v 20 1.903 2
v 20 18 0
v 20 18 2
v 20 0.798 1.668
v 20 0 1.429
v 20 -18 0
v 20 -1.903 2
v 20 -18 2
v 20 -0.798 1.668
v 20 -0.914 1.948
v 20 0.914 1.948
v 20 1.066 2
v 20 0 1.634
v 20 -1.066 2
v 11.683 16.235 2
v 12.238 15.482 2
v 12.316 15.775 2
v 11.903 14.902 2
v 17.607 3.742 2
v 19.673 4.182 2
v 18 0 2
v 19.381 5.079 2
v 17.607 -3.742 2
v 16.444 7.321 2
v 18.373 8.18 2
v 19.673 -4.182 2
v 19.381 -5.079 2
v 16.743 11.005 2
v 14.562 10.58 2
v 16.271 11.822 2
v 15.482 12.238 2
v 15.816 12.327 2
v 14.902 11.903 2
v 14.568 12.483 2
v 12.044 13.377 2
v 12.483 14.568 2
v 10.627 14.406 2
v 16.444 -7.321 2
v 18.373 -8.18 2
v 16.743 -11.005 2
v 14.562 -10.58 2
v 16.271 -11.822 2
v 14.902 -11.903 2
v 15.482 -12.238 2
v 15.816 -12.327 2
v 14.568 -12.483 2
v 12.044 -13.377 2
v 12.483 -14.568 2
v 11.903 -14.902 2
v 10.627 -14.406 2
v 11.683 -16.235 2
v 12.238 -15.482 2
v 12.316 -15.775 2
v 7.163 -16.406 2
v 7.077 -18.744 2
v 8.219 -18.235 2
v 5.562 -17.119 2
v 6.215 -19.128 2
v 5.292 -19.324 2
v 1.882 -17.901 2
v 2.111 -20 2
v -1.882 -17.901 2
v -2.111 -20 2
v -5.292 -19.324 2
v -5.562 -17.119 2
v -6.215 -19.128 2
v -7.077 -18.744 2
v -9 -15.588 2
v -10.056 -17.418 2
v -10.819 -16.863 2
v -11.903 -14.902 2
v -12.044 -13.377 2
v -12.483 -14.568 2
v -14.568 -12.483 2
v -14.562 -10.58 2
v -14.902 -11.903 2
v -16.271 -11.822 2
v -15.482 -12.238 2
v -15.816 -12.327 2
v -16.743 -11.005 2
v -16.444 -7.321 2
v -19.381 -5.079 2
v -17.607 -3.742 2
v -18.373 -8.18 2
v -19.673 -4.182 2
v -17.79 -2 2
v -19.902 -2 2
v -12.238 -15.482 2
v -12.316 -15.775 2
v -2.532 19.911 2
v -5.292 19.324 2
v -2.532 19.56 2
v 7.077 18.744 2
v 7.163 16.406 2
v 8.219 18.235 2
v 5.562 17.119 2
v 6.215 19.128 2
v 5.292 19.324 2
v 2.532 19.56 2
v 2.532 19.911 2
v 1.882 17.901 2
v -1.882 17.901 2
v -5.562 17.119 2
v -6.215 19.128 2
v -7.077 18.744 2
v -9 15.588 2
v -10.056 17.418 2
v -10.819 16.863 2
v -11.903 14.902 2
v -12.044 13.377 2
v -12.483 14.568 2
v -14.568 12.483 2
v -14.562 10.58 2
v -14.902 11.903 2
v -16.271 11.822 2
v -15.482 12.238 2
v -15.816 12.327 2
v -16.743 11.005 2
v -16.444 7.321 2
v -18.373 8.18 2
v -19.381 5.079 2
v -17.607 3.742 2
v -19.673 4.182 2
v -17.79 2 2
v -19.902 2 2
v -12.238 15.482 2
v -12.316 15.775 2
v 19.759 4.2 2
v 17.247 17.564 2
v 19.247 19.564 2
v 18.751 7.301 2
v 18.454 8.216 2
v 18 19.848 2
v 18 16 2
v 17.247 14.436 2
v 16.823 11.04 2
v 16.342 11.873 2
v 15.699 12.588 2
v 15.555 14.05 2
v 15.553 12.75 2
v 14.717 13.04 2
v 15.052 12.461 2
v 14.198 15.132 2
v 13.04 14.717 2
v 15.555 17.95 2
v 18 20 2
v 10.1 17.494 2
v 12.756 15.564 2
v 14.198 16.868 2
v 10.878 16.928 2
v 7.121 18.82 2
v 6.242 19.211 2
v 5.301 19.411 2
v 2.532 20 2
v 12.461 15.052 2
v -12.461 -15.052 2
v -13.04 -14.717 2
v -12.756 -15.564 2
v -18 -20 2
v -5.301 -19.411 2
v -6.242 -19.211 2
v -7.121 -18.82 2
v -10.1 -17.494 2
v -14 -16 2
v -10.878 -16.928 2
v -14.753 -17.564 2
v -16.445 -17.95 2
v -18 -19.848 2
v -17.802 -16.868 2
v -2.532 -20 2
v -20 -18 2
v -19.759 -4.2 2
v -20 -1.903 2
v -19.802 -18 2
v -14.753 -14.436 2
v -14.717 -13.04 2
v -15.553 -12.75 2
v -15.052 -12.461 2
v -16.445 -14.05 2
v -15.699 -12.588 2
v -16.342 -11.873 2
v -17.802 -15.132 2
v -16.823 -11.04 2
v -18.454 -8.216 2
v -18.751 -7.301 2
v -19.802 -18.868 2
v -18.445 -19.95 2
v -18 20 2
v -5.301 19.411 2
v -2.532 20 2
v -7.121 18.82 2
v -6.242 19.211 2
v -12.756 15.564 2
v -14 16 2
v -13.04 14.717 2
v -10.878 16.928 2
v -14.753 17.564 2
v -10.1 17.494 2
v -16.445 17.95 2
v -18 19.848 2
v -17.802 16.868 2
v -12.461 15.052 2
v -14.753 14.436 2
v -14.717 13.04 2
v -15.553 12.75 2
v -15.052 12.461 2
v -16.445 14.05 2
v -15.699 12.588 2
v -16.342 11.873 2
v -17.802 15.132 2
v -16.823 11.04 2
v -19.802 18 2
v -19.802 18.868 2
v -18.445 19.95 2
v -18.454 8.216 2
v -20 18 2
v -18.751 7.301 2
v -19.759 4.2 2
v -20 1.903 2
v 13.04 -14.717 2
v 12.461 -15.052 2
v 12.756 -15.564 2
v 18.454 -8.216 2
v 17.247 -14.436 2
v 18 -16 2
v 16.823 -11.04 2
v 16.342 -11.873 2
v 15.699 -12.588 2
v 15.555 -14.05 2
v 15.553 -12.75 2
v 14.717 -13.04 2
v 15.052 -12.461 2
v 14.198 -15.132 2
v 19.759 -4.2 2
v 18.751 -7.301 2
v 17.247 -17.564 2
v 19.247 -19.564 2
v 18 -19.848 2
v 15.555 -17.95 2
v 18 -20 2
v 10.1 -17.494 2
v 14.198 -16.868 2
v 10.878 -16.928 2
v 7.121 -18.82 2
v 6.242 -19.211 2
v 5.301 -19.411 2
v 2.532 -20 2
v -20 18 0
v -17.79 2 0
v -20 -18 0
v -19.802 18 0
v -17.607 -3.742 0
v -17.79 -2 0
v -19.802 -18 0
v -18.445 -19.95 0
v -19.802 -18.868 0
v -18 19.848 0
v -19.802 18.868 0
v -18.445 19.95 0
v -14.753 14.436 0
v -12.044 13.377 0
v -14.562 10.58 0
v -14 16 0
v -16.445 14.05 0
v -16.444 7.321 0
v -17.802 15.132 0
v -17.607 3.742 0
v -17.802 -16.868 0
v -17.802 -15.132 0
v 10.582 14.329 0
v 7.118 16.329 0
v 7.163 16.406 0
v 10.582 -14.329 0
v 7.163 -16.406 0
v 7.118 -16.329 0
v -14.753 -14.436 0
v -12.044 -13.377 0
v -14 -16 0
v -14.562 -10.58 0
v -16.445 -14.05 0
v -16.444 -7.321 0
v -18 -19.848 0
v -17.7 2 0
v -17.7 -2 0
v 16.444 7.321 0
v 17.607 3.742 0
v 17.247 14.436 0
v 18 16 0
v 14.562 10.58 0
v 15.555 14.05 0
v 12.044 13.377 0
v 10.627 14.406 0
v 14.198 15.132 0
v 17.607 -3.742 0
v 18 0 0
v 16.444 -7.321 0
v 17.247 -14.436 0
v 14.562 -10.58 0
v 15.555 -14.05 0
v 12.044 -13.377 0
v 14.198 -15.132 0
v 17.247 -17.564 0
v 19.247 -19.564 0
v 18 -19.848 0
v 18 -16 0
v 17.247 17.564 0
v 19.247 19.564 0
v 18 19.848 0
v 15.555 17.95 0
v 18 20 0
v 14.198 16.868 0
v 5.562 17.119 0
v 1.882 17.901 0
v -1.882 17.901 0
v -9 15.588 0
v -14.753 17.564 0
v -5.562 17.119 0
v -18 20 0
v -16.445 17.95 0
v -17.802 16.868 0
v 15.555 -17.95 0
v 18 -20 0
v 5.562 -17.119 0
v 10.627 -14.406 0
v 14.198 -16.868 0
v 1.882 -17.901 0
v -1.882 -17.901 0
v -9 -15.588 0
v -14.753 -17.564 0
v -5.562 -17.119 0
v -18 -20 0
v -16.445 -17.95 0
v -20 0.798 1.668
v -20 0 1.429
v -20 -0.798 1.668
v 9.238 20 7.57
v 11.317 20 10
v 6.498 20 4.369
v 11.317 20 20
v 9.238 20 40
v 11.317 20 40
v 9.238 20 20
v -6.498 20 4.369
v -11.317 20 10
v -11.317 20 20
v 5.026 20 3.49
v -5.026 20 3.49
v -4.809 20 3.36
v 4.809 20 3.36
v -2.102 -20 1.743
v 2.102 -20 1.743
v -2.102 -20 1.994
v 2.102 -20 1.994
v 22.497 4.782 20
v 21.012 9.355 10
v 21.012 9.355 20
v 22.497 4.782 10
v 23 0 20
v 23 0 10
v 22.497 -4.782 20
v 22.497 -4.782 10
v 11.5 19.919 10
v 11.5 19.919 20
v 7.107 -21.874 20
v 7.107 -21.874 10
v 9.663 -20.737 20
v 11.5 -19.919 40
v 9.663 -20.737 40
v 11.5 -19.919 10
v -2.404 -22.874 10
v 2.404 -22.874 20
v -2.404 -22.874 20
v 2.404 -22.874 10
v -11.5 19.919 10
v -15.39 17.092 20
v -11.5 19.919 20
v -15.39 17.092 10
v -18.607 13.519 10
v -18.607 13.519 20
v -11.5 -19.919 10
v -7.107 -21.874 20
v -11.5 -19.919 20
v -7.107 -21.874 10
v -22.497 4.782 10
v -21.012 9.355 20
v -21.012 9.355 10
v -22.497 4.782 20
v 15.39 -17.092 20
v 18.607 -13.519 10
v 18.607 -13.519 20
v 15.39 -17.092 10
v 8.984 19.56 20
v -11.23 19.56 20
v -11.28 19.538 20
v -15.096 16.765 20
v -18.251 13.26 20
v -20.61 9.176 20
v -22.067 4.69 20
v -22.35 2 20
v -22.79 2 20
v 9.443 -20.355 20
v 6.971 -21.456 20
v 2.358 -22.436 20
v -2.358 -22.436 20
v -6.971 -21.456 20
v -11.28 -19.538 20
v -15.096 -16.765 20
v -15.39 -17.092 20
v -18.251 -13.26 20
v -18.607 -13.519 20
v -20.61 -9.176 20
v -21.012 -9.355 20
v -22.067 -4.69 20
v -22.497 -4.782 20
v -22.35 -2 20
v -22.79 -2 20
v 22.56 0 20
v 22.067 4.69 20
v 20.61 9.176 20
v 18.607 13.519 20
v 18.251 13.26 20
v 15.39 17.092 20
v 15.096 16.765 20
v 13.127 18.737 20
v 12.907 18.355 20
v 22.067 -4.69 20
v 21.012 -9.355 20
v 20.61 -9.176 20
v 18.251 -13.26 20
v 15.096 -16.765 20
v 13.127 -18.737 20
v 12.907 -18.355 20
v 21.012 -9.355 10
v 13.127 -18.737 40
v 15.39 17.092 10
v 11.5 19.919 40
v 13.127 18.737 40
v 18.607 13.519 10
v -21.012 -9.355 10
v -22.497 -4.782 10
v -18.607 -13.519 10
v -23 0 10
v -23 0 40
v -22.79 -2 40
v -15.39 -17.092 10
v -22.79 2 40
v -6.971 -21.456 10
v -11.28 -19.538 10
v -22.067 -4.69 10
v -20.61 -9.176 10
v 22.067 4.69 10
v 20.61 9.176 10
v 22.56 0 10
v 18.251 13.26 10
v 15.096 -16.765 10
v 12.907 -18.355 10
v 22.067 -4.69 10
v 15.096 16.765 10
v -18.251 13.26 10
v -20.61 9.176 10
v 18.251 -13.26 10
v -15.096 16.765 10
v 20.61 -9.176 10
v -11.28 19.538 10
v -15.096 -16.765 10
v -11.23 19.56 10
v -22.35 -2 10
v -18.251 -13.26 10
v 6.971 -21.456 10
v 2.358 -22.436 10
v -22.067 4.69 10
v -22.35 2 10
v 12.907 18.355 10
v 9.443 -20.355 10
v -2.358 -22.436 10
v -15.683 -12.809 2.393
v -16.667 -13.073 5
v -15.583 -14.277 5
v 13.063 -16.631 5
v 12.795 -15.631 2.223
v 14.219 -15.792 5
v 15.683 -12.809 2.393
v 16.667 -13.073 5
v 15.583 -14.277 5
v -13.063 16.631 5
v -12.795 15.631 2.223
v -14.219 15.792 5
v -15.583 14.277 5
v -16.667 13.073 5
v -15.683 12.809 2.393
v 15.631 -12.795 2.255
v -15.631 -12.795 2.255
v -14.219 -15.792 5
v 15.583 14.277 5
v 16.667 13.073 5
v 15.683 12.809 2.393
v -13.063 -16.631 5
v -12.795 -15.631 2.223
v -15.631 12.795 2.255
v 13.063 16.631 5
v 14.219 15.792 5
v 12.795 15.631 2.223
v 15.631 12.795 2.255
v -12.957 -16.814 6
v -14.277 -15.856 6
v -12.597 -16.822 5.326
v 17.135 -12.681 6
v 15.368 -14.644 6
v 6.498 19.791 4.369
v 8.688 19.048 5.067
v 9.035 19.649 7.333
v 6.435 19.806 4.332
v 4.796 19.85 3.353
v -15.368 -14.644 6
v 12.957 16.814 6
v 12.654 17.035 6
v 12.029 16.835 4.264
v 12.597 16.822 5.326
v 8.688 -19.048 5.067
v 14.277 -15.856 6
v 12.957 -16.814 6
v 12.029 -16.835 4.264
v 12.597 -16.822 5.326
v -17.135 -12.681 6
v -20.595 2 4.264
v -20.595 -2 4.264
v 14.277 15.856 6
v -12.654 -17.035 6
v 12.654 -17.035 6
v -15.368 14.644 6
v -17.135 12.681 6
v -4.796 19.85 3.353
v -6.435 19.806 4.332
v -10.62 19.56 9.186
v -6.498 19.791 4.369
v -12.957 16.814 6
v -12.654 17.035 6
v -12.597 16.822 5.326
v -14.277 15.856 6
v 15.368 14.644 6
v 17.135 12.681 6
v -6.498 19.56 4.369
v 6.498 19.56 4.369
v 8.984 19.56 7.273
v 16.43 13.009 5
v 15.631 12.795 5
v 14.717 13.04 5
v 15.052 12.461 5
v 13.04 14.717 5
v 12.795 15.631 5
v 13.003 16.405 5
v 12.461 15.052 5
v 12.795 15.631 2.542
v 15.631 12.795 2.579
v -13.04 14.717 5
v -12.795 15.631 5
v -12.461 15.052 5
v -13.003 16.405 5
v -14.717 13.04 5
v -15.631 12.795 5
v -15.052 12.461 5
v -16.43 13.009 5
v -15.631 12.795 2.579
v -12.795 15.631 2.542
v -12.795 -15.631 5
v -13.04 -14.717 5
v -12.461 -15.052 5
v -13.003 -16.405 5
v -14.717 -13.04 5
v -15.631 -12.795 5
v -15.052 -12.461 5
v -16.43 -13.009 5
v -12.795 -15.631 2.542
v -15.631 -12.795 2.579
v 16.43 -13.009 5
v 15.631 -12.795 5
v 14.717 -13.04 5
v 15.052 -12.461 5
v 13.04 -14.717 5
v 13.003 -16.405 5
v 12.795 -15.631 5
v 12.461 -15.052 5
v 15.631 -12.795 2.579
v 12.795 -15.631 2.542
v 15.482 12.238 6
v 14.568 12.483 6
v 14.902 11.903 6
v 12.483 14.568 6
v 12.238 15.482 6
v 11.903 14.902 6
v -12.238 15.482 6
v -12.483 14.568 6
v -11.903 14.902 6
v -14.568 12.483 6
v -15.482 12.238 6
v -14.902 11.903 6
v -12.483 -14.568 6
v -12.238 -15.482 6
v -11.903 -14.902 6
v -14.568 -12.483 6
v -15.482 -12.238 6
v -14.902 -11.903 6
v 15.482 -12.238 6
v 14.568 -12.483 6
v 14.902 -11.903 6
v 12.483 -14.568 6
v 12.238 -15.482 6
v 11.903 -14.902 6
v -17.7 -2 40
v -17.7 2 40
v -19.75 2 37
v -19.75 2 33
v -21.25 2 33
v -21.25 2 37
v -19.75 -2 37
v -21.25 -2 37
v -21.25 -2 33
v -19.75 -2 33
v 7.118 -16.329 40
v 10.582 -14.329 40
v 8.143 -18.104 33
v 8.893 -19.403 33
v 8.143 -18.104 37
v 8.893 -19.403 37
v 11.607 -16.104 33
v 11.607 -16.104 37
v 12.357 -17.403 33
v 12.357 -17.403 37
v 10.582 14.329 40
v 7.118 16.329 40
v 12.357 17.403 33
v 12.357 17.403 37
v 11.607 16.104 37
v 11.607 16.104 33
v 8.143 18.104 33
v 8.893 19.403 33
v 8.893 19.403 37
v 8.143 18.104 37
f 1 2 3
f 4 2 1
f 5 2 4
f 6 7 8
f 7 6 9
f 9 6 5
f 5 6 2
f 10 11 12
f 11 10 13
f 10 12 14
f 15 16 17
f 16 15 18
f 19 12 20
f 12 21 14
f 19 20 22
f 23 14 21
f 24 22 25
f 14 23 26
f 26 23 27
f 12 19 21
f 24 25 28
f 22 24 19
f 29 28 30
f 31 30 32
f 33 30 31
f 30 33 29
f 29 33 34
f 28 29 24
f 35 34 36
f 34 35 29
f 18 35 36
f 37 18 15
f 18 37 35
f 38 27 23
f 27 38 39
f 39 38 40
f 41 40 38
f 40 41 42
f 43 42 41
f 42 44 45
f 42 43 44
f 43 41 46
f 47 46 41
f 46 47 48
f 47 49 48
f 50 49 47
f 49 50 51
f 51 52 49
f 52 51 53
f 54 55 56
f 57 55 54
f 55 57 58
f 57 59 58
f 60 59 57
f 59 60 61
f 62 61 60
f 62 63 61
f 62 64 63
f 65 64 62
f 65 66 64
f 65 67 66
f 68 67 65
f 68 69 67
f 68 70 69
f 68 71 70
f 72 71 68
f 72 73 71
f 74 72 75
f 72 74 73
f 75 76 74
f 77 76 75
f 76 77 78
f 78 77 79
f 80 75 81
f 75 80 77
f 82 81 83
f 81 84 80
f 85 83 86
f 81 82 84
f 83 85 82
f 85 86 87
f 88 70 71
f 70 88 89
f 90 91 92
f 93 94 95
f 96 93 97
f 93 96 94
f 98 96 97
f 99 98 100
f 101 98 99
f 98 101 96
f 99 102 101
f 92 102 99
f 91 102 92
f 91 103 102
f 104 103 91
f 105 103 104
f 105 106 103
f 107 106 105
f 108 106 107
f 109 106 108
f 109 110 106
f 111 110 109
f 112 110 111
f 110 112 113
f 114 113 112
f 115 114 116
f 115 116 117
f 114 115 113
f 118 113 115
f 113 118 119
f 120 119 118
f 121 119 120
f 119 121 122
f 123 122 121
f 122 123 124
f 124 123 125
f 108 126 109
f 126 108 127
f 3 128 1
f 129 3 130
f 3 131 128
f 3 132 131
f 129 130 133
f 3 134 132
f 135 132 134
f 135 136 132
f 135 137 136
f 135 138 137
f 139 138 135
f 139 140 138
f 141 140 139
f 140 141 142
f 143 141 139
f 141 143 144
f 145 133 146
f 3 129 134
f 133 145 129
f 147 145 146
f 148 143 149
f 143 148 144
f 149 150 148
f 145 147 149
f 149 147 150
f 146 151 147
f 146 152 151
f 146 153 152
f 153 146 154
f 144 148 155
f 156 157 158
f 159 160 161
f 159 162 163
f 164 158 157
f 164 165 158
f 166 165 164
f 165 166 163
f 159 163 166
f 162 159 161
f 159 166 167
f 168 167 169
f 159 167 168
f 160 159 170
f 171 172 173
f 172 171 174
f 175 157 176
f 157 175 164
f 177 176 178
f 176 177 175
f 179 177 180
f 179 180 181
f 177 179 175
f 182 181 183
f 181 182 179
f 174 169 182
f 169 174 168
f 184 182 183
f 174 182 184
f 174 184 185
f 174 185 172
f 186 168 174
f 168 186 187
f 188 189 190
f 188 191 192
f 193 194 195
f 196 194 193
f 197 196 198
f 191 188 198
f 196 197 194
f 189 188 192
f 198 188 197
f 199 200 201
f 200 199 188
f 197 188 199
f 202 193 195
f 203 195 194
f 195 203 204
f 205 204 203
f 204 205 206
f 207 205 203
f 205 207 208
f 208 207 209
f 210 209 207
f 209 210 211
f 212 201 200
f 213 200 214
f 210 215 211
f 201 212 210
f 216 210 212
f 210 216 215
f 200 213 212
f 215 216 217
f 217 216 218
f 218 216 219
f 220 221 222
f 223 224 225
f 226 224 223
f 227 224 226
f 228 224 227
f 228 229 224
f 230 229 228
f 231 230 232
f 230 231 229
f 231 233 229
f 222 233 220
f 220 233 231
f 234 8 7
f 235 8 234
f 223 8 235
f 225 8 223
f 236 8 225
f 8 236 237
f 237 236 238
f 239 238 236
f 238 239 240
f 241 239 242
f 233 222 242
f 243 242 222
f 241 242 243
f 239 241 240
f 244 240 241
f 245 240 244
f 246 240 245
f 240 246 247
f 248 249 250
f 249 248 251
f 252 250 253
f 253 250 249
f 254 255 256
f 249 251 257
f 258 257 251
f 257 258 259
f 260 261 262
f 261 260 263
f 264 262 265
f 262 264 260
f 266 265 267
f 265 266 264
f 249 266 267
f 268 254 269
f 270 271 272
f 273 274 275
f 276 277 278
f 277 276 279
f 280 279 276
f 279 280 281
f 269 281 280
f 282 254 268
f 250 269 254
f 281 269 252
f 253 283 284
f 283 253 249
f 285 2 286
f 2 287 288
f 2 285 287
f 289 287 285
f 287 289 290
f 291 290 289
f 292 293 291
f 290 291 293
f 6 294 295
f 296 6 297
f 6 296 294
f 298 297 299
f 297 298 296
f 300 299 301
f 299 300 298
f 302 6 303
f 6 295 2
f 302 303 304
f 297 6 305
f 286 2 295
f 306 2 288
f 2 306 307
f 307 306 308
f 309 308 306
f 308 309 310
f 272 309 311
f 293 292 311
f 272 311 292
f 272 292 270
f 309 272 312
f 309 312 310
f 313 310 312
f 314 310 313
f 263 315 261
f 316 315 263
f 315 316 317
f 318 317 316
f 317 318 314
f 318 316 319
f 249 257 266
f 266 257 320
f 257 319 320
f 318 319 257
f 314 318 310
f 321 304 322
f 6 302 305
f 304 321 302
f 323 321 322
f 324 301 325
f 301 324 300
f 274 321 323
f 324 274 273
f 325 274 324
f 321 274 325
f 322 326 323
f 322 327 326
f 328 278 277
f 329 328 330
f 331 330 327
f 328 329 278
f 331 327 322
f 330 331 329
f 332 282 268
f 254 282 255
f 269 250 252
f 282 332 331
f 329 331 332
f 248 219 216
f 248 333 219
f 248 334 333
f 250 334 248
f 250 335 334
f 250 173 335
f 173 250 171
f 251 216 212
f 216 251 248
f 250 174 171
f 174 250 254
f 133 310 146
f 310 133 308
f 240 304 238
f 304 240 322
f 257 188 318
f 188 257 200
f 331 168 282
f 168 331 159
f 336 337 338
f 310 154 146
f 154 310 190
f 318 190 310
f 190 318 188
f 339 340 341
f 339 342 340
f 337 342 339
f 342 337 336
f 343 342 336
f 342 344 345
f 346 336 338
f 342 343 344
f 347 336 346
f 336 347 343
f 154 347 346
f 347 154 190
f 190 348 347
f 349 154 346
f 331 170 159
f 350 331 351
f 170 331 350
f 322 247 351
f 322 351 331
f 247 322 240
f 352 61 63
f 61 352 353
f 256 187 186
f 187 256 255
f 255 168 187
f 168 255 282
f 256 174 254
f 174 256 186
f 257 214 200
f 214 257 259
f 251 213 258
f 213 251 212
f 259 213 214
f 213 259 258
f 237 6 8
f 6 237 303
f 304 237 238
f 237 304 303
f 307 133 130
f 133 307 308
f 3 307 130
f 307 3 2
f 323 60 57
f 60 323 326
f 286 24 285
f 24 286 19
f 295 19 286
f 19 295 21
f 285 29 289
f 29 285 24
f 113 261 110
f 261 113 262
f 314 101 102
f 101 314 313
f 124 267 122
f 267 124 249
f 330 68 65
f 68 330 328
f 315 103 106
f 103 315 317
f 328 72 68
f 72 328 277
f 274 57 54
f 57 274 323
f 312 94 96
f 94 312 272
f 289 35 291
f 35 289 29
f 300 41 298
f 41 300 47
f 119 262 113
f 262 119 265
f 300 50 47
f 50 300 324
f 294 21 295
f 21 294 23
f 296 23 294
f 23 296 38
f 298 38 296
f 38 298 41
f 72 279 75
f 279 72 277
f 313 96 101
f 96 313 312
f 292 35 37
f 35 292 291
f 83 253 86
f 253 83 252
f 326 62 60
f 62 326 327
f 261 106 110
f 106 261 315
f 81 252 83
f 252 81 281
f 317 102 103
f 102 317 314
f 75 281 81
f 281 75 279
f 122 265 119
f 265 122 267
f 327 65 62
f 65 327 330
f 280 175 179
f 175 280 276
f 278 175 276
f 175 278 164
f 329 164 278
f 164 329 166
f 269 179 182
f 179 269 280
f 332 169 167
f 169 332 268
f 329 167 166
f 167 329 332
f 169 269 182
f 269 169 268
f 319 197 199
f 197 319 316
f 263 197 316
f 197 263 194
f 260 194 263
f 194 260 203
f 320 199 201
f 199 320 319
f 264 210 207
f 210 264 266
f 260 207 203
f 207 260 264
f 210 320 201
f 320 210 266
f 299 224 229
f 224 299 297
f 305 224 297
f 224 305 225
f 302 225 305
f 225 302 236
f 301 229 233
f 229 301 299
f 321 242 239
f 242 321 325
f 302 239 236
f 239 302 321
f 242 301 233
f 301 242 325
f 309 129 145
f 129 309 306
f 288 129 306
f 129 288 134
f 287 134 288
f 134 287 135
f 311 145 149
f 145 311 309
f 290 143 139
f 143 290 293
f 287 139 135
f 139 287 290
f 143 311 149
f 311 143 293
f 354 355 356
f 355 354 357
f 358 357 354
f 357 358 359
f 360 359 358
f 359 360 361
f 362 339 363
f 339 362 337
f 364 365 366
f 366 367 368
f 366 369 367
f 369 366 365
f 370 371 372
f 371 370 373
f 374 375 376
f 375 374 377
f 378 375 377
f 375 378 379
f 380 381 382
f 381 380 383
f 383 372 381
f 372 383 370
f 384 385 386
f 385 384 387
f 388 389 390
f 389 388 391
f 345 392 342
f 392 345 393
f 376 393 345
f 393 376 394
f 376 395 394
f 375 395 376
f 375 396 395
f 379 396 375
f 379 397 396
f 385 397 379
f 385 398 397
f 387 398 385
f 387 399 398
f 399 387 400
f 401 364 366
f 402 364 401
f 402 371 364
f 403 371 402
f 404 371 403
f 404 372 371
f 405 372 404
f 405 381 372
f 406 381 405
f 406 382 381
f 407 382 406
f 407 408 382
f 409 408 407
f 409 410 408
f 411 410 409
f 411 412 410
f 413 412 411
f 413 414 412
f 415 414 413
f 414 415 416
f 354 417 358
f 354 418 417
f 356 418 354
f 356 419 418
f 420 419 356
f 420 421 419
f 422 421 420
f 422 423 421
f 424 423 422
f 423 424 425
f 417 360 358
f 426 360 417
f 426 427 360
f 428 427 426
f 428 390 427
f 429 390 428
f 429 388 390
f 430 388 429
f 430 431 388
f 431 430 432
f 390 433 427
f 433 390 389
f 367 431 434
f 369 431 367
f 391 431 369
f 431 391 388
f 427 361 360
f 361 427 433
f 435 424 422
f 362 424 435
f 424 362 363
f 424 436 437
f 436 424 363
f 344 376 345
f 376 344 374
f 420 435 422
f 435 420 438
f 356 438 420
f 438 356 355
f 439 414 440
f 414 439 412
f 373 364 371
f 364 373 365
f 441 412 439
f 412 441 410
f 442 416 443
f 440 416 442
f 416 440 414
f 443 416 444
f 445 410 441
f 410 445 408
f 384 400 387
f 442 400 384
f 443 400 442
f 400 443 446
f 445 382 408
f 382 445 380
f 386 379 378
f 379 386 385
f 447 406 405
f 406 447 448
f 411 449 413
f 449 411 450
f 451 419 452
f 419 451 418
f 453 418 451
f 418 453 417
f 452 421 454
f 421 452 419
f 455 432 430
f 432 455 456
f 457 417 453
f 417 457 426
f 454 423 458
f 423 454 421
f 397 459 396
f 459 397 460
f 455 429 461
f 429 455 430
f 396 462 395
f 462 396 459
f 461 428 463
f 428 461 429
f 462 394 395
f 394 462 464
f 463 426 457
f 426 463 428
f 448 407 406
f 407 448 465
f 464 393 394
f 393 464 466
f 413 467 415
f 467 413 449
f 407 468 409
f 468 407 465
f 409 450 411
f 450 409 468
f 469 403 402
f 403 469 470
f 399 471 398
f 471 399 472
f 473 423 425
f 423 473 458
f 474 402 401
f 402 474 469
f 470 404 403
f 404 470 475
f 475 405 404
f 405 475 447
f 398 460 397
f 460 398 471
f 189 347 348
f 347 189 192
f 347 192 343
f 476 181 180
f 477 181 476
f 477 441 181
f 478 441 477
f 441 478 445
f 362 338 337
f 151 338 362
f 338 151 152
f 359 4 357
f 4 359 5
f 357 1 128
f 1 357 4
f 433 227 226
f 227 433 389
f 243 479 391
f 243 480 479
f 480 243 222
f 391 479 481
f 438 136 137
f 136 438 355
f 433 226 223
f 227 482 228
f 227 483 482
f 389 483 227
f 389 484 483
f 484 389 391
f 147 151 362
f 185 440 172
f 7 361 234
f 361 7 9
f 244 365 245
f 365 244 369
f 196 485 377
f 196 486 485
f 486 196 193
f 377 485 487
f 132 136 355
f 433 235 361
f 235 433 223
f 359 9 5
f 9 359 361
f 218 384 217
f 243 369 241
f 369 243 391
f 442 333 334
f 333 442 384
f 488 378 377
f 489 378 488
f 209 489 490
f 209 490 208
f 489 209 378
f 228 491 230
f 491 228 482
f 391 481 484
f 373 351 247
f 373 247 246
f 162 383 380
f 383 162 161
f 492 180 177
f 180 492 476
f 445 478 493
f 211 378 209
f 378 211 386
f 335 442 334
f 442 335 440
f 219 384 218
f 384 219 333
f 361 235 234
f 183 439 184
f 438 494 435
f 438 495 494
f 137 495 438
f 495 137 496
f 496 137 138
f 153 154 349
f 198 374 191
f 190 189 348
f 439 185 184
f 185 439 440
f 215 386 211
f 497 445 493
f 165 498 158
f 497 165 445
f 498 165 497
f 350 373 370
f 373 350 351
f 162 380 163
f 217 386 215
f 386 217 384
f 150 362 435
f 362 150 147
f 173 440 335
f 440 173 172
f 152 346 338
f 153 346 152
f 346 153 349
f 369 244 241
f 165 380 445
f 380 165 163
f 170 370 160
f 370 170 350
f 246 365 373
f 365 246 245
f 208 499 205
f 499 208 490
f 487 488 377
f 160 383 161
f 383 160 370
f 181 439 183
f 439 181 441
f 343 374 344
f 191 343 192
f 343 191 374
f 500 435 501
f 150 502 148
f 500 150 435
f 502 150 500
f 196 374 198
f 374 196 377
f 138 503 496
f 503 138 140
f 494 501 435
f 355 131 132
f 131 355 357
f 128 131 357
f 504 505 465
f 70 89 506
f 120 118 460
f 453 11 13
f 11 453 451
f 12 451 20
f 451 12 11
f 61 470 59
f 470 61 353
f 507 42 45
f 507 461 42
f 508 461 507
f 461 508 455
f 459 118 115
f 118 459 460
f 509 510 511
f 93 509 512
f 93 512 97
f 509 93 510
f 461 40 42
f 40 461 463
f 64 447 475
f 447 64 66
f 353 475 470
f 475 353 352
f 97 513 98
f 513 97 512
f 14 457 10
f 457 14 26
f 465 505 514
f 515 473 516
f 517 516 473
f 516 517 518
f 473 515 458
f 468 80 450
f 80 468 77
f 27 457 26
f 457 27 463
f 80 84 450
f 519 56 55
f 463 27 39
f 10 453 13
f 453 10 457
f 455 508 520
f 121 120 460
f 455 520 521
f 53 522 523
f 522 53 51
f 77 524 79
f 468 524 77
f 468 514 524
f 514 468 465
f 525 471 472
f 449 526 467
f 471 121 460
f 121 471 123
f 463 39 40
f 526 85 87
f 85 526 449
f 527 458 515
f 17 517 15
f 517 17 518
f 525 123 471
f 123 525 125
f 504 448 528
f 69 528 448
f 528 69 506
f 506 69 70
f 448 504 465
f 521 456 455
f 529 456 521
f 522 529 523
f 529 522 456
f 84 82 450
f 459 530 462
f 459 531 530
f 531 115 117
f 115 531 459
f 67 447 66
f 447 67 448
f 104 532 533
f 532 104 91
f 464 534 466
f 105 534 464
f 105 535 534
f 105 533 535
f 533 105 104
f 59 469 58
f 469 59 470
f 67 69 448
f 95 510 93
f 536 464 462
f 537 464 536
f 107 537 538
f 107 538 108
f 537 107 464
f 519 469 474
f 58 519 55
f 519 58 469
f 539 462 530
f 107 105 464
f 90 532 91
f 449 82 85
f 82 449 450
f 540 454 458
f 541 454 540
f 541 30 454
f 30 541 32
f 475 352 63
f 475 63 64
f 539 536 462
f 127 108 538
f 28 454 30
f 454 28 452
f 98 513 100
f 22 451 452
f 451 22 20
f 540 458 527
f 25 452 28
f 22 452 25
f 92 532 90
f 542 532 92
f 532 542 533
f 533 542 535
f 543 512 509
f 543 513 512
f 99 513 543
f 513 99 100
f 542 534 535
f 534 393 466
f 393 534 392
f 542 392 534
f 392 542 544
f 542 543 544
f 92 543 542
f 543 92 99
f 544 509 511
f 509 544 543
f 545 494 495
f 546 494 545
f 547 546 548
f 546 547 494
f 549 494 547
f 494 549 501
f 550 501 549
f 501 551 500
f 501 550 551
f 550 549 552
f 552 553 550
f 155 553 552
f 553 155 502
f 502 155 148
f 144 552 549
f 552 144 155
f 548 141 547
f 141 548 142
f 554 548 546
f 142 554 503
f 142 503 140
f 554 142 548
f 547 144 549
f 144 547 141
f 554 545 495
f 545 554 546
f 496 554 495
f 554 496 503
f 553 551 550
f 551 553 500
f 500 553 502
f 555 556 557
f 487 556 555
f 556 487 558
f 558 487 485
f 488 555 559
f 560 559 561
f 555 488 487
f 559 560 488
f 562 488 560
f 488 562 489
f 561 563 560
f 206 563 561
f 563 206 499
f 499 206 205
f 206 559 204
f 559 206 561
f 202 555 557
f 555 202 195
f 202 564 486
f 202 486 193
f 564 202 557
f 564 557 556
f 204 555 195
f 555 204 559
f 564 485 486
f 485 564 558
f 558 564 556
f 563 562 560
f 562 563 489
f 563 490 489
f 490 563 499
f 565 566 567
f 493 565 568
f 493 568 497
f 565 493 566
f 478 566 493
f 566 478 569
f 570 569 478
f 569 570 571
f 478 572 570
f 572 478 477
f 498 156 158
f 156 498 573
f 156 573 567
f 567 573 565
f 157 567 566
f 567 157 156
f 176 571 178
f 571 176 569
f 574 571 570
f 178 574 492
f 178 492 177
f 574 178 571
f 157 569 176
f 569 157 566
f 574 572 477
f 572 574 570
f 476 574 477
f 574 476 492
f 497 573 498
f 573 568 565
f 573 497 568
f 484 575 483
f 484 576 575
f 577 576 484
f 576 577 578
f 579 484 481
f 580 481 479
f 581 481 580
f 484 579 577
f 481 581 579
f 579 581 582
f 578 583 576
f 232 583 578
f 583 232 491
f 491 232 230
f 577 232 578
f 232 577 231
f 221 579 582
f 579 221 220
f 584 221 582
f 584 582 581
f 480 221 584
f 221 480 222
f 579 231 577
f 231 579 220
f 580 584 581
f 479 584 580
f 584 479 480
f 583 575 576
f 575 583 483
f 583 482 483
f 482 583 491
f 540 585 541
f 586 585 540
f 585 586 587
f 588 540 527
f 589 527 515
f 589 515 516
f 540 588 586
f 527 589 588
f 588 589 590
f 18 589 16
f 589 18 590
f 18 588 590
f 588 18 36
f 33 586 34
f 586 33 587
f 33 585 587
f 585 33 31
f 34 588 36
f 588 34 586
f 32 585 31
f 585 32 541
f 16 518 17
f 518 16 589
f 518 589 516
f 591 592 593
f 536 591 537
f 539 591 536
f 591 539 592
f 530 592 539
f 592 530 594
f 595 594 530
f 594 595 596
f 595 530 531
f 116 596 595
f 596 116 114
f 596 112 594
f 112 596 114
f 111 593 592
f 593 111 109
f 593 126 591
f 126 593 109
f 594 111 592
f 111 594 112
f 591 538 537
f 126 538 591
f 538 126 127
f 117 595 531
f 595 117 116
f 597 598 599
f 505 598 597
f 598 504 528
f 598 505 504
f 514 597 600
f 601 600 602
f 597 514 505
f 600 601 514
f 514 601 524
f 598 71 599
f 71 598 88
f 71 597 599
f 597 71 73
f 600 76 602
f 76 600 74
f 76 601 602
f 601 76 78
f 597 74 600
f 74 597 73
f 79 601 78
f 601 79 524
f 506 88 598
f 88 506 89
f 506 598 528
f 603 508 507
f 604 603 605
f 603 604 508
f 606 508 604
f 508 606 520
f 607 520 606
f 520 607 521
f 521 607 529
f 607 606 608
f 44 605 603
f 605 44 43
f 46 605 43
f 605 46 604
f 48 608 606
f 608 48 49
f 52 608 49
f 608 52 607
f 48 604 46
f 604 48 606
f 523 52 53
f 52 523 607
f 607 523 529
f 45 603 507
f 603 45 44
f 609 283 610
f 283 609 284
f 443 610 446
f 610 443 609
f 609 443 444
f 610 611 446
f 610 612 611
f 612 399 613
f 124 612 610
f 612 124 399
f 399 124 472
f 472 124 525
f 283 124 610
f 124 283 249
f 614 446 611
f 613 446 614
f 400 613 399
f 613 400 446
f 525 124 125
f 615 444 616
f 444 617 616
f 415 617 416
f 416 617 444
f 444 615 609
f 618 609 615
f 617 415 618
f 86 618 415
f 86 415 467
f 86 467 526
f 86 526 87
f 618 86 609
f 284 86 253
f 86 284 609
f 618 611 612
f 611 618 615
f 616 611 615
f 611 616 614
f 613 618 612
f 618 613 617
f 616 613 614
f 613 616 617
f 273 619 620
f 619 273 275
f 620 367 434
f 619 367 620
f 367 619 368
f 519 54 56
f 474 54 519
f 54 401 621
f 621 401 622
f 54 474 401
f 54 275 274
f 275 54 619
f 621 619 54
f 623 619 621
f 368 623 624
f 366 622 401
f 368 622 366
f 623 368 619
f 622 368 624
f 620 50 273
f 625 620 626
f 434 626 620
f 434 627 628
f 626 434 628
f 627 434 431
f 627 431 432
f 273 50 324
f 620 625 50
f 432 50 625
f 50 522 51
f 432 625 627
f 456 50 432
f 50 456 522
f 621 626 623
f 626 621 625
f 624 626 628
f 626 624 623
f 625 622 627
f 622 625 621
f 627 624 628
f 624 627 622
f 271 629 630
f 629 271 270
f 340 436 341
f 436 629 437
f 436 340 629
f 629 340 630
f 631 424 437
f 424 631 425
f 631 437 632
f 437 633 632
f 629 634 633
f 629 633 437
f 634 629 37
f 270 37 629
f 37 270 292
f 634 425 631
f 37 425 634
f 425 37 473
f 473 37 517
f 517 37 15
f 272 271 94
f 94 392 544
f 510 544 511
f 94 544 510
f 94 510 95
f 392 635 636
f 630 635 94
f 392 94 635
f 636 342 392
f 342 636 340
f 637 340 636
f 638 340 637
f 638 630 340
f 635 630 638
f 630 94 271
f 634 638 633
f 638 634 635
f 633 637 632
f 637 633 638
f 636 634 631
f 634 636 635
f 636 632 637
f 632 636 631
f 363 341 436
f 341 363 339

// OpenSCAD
// file: inc/PG35L.scad
// PG35L motor by EiNSTeiN_ <einstein@g3nius.org>


PG35L(false);

module PG35L(mini_hyena=true) {

	difference() {
		union() {
		cylinder(h=42.8,r=35/2); // motor body
		// wings..
		difference() {
			hull() {
				intersection() {
					translate([-50/2, -35/2, 0]) cube([50,35/2,5]);
					cylinder(h=5,r=35/2);
				}
				translate([49/2-7.5/2,0,0]) cylinder(h=5,r=7.5/2);
				translate([-49/2+7.5/2,0,0]) cylinder(h=5,r=7.5/2);
			}
			translate([49/2-7.5/2,0,0]) cylinder(h=5,r=3.5/2);
			translate([-49/2+7.5/2,0,0]) cylinder(h=5,r=3.5/2);
		}
		}
		for(i=[0:2]) {
			rotate([0,0,120*i]) translate([0, -35/2+0.5, 23/2]) cube([8, 3, 23], center=true);
		}
	}

	rotate([0,0,15]) translate([0,50/2-7,42.8-13/2-3]) cube([16, 7, 13], center=true);

	translate([0,0,-4.6]) cylinder(h=4.6,r=10/2); // motor shaft
	translate([0,0,-4.6-8]) cylinder(h=8,r=4.8/2); // motor shaft
	
	// mini hyena: H=10mm, ID=5mm, OD=12.5mm
	if(mini_hyena) #translate([0,0,-5]) rotate([180,0,0]) difference() {
		union() {
			cylinder(h=5.5,r=12.5/2);
			translate([0,0,5.5]) cylinder(h=2,r2=10.5/2, r1=12.5/2);
			translate([0,0,5.5+2]) cylinder(h=2, r2=12.5/2,r1=10.5/2);
			translate([0,0,9.5]) cylinder(h=0.5,r=12.5/2);
		}
		cylinder(h=10,r=5/2);
	}
}
// main file
use <inc/PG35L.scad>;

motor_fan_duct(size=40);

%translate([0,0,60]) rotate([180,0,0]) PG35L(mini_hyena=true);


module nut(d,h,horizontal=true){
    cornerdiameter =  (d / 2) / cos (180 / 6);
    cylinder(h = h, r = cornerdiameter, $fn = 6);
    if(horizontal){
        for(i = [1:6]){
            rotate([0,0,60*i]) translate([-cornerdiameter-0.2,0,0]) rotate([0,0,-45]) cube([2,2,h]);
        }
    }
}

module motor_fan_duct(size=40) {
	// Body Parameters
	borderthickness=2;
	cornerradius=2;
	thickness=2;
	
	// Screw Hole Parameters
	screwradius=4/2;
	screwinset=4;
	
	// Spine Parameters
	spines=10;
	spinesize=2;
	spineoffset=7;
	spinerotation=0;
	
	
	// Below are not parameters //
	
	// Calculate helper variables
	holeradius=size/2-borderthickness;

	translate([-size/2, -size/2, 0]) fan_grill();
	
	difference() {
		duct_flat();
		screw_holes();
	}
	intersection() {
		hull() duct_flat(height=60);
		screw_shell();
	}
	intersection() {
		hull() duct_flat(height=60);
		for(i=[0:2]) {
			rotate([0,0,120*i]) {
				translate([-size/2-cornerradius-1,-2,0]) 
					difference() {
						cube([5.3, 4, 40]);
						translate([3.5/2,0,33]) cube([1.5, 5, 4]);
					}
			}
		}
	}

	module screw_shell() {
		difference() {
			for(i=[0:3]) {
				rotate([0,0,i*90]) translate([size/2-screwinset, size/2-screwinset, thickness]) {
					rotate([0,0,-45]) nut(d=7,h=4);
				}
			}
			screw_holes();
		}
	}

	module screw_holes() {
		for(i=[0:3]) {
			rotate([0,0,i*90]) translate([size/2-screwinset, size/2-screwinset, thickness]) {
				rotate([0,0,-45]) nut(d=6,h=3);
			}
		}
	}

	module duct_flat(height=20) {
		difference() {
			duct(height);
			translate([-size/2,size/2,0]) cube([size,size,60]);
		}
		// perform projection sorcery in order to flatten the side of the shape
		translate([0,size/2-0.44,0]) rotate([-90,0,0]) linear_extrude(height=0.44) projection(cut=false) rotate([90,0,0]) intersection() {
			duct(height);
			translate([-size/2,size/2,0]) cube([size,size,60]);
		}
	}

	module duct(height=20) {
		translate([0,0,10]) difference() {
			cylinder(r=46/2,h=height-10);
			cylinder(r=46/2-0.44,h=height-10);
		}
		difference() {
			cylinder(r1=39/2, r2=46/2,h=10);
			cylinder(r1=39/2-0,44, r2=46/2-0.44,h=10);
		}
	}
	
	module fan_grill()
	{
		difference()
		{
			body();
	
			// hole
			translate([size/2,size/2,0]) cylinder(r=holeradius,h=thickness);
	
			// screws
			translate([screwinset,screwinset,0]) cylinder(r=screwradius,h=thickness+1);
			translate([screwinset,size-screwinset,0]) cylinder(r=screwradius,h=thickness+1);
			translate([size-screwinset,screwinset,0]) cylinder(r=screwradius,h=thickness+1);
			translate([size-screwinset,size-screwinset,0]) cylinder(r=screwradius,h=thickness+1);
		}
		translate([size/2,size/2,0])
		*interrior();
	}
	
	module body()
	{
		translate([0,cornerradius,0]) cube(size=[size,size-(cornerradius*2),thickness]);
		translate([cornerradius,0,0]) cube(size=[size-(cornerradius*2),size,thickness]);
		translate([cornerradius,cornerradius,0]) cylinder(r=cornerradius,h=thickness);
		translate([cornerradius,size-cornerradius,0]) cylinder(r=cornerradius,h=thickness);
		translate([size-cornerradius,cornerradius,0]) cylinder(r=cornerradius,h=thickness);
		translate([size-cornerradius,size-cornerradius,0]) cylinder(r=cornerradius,h=thickness);
	}
}
